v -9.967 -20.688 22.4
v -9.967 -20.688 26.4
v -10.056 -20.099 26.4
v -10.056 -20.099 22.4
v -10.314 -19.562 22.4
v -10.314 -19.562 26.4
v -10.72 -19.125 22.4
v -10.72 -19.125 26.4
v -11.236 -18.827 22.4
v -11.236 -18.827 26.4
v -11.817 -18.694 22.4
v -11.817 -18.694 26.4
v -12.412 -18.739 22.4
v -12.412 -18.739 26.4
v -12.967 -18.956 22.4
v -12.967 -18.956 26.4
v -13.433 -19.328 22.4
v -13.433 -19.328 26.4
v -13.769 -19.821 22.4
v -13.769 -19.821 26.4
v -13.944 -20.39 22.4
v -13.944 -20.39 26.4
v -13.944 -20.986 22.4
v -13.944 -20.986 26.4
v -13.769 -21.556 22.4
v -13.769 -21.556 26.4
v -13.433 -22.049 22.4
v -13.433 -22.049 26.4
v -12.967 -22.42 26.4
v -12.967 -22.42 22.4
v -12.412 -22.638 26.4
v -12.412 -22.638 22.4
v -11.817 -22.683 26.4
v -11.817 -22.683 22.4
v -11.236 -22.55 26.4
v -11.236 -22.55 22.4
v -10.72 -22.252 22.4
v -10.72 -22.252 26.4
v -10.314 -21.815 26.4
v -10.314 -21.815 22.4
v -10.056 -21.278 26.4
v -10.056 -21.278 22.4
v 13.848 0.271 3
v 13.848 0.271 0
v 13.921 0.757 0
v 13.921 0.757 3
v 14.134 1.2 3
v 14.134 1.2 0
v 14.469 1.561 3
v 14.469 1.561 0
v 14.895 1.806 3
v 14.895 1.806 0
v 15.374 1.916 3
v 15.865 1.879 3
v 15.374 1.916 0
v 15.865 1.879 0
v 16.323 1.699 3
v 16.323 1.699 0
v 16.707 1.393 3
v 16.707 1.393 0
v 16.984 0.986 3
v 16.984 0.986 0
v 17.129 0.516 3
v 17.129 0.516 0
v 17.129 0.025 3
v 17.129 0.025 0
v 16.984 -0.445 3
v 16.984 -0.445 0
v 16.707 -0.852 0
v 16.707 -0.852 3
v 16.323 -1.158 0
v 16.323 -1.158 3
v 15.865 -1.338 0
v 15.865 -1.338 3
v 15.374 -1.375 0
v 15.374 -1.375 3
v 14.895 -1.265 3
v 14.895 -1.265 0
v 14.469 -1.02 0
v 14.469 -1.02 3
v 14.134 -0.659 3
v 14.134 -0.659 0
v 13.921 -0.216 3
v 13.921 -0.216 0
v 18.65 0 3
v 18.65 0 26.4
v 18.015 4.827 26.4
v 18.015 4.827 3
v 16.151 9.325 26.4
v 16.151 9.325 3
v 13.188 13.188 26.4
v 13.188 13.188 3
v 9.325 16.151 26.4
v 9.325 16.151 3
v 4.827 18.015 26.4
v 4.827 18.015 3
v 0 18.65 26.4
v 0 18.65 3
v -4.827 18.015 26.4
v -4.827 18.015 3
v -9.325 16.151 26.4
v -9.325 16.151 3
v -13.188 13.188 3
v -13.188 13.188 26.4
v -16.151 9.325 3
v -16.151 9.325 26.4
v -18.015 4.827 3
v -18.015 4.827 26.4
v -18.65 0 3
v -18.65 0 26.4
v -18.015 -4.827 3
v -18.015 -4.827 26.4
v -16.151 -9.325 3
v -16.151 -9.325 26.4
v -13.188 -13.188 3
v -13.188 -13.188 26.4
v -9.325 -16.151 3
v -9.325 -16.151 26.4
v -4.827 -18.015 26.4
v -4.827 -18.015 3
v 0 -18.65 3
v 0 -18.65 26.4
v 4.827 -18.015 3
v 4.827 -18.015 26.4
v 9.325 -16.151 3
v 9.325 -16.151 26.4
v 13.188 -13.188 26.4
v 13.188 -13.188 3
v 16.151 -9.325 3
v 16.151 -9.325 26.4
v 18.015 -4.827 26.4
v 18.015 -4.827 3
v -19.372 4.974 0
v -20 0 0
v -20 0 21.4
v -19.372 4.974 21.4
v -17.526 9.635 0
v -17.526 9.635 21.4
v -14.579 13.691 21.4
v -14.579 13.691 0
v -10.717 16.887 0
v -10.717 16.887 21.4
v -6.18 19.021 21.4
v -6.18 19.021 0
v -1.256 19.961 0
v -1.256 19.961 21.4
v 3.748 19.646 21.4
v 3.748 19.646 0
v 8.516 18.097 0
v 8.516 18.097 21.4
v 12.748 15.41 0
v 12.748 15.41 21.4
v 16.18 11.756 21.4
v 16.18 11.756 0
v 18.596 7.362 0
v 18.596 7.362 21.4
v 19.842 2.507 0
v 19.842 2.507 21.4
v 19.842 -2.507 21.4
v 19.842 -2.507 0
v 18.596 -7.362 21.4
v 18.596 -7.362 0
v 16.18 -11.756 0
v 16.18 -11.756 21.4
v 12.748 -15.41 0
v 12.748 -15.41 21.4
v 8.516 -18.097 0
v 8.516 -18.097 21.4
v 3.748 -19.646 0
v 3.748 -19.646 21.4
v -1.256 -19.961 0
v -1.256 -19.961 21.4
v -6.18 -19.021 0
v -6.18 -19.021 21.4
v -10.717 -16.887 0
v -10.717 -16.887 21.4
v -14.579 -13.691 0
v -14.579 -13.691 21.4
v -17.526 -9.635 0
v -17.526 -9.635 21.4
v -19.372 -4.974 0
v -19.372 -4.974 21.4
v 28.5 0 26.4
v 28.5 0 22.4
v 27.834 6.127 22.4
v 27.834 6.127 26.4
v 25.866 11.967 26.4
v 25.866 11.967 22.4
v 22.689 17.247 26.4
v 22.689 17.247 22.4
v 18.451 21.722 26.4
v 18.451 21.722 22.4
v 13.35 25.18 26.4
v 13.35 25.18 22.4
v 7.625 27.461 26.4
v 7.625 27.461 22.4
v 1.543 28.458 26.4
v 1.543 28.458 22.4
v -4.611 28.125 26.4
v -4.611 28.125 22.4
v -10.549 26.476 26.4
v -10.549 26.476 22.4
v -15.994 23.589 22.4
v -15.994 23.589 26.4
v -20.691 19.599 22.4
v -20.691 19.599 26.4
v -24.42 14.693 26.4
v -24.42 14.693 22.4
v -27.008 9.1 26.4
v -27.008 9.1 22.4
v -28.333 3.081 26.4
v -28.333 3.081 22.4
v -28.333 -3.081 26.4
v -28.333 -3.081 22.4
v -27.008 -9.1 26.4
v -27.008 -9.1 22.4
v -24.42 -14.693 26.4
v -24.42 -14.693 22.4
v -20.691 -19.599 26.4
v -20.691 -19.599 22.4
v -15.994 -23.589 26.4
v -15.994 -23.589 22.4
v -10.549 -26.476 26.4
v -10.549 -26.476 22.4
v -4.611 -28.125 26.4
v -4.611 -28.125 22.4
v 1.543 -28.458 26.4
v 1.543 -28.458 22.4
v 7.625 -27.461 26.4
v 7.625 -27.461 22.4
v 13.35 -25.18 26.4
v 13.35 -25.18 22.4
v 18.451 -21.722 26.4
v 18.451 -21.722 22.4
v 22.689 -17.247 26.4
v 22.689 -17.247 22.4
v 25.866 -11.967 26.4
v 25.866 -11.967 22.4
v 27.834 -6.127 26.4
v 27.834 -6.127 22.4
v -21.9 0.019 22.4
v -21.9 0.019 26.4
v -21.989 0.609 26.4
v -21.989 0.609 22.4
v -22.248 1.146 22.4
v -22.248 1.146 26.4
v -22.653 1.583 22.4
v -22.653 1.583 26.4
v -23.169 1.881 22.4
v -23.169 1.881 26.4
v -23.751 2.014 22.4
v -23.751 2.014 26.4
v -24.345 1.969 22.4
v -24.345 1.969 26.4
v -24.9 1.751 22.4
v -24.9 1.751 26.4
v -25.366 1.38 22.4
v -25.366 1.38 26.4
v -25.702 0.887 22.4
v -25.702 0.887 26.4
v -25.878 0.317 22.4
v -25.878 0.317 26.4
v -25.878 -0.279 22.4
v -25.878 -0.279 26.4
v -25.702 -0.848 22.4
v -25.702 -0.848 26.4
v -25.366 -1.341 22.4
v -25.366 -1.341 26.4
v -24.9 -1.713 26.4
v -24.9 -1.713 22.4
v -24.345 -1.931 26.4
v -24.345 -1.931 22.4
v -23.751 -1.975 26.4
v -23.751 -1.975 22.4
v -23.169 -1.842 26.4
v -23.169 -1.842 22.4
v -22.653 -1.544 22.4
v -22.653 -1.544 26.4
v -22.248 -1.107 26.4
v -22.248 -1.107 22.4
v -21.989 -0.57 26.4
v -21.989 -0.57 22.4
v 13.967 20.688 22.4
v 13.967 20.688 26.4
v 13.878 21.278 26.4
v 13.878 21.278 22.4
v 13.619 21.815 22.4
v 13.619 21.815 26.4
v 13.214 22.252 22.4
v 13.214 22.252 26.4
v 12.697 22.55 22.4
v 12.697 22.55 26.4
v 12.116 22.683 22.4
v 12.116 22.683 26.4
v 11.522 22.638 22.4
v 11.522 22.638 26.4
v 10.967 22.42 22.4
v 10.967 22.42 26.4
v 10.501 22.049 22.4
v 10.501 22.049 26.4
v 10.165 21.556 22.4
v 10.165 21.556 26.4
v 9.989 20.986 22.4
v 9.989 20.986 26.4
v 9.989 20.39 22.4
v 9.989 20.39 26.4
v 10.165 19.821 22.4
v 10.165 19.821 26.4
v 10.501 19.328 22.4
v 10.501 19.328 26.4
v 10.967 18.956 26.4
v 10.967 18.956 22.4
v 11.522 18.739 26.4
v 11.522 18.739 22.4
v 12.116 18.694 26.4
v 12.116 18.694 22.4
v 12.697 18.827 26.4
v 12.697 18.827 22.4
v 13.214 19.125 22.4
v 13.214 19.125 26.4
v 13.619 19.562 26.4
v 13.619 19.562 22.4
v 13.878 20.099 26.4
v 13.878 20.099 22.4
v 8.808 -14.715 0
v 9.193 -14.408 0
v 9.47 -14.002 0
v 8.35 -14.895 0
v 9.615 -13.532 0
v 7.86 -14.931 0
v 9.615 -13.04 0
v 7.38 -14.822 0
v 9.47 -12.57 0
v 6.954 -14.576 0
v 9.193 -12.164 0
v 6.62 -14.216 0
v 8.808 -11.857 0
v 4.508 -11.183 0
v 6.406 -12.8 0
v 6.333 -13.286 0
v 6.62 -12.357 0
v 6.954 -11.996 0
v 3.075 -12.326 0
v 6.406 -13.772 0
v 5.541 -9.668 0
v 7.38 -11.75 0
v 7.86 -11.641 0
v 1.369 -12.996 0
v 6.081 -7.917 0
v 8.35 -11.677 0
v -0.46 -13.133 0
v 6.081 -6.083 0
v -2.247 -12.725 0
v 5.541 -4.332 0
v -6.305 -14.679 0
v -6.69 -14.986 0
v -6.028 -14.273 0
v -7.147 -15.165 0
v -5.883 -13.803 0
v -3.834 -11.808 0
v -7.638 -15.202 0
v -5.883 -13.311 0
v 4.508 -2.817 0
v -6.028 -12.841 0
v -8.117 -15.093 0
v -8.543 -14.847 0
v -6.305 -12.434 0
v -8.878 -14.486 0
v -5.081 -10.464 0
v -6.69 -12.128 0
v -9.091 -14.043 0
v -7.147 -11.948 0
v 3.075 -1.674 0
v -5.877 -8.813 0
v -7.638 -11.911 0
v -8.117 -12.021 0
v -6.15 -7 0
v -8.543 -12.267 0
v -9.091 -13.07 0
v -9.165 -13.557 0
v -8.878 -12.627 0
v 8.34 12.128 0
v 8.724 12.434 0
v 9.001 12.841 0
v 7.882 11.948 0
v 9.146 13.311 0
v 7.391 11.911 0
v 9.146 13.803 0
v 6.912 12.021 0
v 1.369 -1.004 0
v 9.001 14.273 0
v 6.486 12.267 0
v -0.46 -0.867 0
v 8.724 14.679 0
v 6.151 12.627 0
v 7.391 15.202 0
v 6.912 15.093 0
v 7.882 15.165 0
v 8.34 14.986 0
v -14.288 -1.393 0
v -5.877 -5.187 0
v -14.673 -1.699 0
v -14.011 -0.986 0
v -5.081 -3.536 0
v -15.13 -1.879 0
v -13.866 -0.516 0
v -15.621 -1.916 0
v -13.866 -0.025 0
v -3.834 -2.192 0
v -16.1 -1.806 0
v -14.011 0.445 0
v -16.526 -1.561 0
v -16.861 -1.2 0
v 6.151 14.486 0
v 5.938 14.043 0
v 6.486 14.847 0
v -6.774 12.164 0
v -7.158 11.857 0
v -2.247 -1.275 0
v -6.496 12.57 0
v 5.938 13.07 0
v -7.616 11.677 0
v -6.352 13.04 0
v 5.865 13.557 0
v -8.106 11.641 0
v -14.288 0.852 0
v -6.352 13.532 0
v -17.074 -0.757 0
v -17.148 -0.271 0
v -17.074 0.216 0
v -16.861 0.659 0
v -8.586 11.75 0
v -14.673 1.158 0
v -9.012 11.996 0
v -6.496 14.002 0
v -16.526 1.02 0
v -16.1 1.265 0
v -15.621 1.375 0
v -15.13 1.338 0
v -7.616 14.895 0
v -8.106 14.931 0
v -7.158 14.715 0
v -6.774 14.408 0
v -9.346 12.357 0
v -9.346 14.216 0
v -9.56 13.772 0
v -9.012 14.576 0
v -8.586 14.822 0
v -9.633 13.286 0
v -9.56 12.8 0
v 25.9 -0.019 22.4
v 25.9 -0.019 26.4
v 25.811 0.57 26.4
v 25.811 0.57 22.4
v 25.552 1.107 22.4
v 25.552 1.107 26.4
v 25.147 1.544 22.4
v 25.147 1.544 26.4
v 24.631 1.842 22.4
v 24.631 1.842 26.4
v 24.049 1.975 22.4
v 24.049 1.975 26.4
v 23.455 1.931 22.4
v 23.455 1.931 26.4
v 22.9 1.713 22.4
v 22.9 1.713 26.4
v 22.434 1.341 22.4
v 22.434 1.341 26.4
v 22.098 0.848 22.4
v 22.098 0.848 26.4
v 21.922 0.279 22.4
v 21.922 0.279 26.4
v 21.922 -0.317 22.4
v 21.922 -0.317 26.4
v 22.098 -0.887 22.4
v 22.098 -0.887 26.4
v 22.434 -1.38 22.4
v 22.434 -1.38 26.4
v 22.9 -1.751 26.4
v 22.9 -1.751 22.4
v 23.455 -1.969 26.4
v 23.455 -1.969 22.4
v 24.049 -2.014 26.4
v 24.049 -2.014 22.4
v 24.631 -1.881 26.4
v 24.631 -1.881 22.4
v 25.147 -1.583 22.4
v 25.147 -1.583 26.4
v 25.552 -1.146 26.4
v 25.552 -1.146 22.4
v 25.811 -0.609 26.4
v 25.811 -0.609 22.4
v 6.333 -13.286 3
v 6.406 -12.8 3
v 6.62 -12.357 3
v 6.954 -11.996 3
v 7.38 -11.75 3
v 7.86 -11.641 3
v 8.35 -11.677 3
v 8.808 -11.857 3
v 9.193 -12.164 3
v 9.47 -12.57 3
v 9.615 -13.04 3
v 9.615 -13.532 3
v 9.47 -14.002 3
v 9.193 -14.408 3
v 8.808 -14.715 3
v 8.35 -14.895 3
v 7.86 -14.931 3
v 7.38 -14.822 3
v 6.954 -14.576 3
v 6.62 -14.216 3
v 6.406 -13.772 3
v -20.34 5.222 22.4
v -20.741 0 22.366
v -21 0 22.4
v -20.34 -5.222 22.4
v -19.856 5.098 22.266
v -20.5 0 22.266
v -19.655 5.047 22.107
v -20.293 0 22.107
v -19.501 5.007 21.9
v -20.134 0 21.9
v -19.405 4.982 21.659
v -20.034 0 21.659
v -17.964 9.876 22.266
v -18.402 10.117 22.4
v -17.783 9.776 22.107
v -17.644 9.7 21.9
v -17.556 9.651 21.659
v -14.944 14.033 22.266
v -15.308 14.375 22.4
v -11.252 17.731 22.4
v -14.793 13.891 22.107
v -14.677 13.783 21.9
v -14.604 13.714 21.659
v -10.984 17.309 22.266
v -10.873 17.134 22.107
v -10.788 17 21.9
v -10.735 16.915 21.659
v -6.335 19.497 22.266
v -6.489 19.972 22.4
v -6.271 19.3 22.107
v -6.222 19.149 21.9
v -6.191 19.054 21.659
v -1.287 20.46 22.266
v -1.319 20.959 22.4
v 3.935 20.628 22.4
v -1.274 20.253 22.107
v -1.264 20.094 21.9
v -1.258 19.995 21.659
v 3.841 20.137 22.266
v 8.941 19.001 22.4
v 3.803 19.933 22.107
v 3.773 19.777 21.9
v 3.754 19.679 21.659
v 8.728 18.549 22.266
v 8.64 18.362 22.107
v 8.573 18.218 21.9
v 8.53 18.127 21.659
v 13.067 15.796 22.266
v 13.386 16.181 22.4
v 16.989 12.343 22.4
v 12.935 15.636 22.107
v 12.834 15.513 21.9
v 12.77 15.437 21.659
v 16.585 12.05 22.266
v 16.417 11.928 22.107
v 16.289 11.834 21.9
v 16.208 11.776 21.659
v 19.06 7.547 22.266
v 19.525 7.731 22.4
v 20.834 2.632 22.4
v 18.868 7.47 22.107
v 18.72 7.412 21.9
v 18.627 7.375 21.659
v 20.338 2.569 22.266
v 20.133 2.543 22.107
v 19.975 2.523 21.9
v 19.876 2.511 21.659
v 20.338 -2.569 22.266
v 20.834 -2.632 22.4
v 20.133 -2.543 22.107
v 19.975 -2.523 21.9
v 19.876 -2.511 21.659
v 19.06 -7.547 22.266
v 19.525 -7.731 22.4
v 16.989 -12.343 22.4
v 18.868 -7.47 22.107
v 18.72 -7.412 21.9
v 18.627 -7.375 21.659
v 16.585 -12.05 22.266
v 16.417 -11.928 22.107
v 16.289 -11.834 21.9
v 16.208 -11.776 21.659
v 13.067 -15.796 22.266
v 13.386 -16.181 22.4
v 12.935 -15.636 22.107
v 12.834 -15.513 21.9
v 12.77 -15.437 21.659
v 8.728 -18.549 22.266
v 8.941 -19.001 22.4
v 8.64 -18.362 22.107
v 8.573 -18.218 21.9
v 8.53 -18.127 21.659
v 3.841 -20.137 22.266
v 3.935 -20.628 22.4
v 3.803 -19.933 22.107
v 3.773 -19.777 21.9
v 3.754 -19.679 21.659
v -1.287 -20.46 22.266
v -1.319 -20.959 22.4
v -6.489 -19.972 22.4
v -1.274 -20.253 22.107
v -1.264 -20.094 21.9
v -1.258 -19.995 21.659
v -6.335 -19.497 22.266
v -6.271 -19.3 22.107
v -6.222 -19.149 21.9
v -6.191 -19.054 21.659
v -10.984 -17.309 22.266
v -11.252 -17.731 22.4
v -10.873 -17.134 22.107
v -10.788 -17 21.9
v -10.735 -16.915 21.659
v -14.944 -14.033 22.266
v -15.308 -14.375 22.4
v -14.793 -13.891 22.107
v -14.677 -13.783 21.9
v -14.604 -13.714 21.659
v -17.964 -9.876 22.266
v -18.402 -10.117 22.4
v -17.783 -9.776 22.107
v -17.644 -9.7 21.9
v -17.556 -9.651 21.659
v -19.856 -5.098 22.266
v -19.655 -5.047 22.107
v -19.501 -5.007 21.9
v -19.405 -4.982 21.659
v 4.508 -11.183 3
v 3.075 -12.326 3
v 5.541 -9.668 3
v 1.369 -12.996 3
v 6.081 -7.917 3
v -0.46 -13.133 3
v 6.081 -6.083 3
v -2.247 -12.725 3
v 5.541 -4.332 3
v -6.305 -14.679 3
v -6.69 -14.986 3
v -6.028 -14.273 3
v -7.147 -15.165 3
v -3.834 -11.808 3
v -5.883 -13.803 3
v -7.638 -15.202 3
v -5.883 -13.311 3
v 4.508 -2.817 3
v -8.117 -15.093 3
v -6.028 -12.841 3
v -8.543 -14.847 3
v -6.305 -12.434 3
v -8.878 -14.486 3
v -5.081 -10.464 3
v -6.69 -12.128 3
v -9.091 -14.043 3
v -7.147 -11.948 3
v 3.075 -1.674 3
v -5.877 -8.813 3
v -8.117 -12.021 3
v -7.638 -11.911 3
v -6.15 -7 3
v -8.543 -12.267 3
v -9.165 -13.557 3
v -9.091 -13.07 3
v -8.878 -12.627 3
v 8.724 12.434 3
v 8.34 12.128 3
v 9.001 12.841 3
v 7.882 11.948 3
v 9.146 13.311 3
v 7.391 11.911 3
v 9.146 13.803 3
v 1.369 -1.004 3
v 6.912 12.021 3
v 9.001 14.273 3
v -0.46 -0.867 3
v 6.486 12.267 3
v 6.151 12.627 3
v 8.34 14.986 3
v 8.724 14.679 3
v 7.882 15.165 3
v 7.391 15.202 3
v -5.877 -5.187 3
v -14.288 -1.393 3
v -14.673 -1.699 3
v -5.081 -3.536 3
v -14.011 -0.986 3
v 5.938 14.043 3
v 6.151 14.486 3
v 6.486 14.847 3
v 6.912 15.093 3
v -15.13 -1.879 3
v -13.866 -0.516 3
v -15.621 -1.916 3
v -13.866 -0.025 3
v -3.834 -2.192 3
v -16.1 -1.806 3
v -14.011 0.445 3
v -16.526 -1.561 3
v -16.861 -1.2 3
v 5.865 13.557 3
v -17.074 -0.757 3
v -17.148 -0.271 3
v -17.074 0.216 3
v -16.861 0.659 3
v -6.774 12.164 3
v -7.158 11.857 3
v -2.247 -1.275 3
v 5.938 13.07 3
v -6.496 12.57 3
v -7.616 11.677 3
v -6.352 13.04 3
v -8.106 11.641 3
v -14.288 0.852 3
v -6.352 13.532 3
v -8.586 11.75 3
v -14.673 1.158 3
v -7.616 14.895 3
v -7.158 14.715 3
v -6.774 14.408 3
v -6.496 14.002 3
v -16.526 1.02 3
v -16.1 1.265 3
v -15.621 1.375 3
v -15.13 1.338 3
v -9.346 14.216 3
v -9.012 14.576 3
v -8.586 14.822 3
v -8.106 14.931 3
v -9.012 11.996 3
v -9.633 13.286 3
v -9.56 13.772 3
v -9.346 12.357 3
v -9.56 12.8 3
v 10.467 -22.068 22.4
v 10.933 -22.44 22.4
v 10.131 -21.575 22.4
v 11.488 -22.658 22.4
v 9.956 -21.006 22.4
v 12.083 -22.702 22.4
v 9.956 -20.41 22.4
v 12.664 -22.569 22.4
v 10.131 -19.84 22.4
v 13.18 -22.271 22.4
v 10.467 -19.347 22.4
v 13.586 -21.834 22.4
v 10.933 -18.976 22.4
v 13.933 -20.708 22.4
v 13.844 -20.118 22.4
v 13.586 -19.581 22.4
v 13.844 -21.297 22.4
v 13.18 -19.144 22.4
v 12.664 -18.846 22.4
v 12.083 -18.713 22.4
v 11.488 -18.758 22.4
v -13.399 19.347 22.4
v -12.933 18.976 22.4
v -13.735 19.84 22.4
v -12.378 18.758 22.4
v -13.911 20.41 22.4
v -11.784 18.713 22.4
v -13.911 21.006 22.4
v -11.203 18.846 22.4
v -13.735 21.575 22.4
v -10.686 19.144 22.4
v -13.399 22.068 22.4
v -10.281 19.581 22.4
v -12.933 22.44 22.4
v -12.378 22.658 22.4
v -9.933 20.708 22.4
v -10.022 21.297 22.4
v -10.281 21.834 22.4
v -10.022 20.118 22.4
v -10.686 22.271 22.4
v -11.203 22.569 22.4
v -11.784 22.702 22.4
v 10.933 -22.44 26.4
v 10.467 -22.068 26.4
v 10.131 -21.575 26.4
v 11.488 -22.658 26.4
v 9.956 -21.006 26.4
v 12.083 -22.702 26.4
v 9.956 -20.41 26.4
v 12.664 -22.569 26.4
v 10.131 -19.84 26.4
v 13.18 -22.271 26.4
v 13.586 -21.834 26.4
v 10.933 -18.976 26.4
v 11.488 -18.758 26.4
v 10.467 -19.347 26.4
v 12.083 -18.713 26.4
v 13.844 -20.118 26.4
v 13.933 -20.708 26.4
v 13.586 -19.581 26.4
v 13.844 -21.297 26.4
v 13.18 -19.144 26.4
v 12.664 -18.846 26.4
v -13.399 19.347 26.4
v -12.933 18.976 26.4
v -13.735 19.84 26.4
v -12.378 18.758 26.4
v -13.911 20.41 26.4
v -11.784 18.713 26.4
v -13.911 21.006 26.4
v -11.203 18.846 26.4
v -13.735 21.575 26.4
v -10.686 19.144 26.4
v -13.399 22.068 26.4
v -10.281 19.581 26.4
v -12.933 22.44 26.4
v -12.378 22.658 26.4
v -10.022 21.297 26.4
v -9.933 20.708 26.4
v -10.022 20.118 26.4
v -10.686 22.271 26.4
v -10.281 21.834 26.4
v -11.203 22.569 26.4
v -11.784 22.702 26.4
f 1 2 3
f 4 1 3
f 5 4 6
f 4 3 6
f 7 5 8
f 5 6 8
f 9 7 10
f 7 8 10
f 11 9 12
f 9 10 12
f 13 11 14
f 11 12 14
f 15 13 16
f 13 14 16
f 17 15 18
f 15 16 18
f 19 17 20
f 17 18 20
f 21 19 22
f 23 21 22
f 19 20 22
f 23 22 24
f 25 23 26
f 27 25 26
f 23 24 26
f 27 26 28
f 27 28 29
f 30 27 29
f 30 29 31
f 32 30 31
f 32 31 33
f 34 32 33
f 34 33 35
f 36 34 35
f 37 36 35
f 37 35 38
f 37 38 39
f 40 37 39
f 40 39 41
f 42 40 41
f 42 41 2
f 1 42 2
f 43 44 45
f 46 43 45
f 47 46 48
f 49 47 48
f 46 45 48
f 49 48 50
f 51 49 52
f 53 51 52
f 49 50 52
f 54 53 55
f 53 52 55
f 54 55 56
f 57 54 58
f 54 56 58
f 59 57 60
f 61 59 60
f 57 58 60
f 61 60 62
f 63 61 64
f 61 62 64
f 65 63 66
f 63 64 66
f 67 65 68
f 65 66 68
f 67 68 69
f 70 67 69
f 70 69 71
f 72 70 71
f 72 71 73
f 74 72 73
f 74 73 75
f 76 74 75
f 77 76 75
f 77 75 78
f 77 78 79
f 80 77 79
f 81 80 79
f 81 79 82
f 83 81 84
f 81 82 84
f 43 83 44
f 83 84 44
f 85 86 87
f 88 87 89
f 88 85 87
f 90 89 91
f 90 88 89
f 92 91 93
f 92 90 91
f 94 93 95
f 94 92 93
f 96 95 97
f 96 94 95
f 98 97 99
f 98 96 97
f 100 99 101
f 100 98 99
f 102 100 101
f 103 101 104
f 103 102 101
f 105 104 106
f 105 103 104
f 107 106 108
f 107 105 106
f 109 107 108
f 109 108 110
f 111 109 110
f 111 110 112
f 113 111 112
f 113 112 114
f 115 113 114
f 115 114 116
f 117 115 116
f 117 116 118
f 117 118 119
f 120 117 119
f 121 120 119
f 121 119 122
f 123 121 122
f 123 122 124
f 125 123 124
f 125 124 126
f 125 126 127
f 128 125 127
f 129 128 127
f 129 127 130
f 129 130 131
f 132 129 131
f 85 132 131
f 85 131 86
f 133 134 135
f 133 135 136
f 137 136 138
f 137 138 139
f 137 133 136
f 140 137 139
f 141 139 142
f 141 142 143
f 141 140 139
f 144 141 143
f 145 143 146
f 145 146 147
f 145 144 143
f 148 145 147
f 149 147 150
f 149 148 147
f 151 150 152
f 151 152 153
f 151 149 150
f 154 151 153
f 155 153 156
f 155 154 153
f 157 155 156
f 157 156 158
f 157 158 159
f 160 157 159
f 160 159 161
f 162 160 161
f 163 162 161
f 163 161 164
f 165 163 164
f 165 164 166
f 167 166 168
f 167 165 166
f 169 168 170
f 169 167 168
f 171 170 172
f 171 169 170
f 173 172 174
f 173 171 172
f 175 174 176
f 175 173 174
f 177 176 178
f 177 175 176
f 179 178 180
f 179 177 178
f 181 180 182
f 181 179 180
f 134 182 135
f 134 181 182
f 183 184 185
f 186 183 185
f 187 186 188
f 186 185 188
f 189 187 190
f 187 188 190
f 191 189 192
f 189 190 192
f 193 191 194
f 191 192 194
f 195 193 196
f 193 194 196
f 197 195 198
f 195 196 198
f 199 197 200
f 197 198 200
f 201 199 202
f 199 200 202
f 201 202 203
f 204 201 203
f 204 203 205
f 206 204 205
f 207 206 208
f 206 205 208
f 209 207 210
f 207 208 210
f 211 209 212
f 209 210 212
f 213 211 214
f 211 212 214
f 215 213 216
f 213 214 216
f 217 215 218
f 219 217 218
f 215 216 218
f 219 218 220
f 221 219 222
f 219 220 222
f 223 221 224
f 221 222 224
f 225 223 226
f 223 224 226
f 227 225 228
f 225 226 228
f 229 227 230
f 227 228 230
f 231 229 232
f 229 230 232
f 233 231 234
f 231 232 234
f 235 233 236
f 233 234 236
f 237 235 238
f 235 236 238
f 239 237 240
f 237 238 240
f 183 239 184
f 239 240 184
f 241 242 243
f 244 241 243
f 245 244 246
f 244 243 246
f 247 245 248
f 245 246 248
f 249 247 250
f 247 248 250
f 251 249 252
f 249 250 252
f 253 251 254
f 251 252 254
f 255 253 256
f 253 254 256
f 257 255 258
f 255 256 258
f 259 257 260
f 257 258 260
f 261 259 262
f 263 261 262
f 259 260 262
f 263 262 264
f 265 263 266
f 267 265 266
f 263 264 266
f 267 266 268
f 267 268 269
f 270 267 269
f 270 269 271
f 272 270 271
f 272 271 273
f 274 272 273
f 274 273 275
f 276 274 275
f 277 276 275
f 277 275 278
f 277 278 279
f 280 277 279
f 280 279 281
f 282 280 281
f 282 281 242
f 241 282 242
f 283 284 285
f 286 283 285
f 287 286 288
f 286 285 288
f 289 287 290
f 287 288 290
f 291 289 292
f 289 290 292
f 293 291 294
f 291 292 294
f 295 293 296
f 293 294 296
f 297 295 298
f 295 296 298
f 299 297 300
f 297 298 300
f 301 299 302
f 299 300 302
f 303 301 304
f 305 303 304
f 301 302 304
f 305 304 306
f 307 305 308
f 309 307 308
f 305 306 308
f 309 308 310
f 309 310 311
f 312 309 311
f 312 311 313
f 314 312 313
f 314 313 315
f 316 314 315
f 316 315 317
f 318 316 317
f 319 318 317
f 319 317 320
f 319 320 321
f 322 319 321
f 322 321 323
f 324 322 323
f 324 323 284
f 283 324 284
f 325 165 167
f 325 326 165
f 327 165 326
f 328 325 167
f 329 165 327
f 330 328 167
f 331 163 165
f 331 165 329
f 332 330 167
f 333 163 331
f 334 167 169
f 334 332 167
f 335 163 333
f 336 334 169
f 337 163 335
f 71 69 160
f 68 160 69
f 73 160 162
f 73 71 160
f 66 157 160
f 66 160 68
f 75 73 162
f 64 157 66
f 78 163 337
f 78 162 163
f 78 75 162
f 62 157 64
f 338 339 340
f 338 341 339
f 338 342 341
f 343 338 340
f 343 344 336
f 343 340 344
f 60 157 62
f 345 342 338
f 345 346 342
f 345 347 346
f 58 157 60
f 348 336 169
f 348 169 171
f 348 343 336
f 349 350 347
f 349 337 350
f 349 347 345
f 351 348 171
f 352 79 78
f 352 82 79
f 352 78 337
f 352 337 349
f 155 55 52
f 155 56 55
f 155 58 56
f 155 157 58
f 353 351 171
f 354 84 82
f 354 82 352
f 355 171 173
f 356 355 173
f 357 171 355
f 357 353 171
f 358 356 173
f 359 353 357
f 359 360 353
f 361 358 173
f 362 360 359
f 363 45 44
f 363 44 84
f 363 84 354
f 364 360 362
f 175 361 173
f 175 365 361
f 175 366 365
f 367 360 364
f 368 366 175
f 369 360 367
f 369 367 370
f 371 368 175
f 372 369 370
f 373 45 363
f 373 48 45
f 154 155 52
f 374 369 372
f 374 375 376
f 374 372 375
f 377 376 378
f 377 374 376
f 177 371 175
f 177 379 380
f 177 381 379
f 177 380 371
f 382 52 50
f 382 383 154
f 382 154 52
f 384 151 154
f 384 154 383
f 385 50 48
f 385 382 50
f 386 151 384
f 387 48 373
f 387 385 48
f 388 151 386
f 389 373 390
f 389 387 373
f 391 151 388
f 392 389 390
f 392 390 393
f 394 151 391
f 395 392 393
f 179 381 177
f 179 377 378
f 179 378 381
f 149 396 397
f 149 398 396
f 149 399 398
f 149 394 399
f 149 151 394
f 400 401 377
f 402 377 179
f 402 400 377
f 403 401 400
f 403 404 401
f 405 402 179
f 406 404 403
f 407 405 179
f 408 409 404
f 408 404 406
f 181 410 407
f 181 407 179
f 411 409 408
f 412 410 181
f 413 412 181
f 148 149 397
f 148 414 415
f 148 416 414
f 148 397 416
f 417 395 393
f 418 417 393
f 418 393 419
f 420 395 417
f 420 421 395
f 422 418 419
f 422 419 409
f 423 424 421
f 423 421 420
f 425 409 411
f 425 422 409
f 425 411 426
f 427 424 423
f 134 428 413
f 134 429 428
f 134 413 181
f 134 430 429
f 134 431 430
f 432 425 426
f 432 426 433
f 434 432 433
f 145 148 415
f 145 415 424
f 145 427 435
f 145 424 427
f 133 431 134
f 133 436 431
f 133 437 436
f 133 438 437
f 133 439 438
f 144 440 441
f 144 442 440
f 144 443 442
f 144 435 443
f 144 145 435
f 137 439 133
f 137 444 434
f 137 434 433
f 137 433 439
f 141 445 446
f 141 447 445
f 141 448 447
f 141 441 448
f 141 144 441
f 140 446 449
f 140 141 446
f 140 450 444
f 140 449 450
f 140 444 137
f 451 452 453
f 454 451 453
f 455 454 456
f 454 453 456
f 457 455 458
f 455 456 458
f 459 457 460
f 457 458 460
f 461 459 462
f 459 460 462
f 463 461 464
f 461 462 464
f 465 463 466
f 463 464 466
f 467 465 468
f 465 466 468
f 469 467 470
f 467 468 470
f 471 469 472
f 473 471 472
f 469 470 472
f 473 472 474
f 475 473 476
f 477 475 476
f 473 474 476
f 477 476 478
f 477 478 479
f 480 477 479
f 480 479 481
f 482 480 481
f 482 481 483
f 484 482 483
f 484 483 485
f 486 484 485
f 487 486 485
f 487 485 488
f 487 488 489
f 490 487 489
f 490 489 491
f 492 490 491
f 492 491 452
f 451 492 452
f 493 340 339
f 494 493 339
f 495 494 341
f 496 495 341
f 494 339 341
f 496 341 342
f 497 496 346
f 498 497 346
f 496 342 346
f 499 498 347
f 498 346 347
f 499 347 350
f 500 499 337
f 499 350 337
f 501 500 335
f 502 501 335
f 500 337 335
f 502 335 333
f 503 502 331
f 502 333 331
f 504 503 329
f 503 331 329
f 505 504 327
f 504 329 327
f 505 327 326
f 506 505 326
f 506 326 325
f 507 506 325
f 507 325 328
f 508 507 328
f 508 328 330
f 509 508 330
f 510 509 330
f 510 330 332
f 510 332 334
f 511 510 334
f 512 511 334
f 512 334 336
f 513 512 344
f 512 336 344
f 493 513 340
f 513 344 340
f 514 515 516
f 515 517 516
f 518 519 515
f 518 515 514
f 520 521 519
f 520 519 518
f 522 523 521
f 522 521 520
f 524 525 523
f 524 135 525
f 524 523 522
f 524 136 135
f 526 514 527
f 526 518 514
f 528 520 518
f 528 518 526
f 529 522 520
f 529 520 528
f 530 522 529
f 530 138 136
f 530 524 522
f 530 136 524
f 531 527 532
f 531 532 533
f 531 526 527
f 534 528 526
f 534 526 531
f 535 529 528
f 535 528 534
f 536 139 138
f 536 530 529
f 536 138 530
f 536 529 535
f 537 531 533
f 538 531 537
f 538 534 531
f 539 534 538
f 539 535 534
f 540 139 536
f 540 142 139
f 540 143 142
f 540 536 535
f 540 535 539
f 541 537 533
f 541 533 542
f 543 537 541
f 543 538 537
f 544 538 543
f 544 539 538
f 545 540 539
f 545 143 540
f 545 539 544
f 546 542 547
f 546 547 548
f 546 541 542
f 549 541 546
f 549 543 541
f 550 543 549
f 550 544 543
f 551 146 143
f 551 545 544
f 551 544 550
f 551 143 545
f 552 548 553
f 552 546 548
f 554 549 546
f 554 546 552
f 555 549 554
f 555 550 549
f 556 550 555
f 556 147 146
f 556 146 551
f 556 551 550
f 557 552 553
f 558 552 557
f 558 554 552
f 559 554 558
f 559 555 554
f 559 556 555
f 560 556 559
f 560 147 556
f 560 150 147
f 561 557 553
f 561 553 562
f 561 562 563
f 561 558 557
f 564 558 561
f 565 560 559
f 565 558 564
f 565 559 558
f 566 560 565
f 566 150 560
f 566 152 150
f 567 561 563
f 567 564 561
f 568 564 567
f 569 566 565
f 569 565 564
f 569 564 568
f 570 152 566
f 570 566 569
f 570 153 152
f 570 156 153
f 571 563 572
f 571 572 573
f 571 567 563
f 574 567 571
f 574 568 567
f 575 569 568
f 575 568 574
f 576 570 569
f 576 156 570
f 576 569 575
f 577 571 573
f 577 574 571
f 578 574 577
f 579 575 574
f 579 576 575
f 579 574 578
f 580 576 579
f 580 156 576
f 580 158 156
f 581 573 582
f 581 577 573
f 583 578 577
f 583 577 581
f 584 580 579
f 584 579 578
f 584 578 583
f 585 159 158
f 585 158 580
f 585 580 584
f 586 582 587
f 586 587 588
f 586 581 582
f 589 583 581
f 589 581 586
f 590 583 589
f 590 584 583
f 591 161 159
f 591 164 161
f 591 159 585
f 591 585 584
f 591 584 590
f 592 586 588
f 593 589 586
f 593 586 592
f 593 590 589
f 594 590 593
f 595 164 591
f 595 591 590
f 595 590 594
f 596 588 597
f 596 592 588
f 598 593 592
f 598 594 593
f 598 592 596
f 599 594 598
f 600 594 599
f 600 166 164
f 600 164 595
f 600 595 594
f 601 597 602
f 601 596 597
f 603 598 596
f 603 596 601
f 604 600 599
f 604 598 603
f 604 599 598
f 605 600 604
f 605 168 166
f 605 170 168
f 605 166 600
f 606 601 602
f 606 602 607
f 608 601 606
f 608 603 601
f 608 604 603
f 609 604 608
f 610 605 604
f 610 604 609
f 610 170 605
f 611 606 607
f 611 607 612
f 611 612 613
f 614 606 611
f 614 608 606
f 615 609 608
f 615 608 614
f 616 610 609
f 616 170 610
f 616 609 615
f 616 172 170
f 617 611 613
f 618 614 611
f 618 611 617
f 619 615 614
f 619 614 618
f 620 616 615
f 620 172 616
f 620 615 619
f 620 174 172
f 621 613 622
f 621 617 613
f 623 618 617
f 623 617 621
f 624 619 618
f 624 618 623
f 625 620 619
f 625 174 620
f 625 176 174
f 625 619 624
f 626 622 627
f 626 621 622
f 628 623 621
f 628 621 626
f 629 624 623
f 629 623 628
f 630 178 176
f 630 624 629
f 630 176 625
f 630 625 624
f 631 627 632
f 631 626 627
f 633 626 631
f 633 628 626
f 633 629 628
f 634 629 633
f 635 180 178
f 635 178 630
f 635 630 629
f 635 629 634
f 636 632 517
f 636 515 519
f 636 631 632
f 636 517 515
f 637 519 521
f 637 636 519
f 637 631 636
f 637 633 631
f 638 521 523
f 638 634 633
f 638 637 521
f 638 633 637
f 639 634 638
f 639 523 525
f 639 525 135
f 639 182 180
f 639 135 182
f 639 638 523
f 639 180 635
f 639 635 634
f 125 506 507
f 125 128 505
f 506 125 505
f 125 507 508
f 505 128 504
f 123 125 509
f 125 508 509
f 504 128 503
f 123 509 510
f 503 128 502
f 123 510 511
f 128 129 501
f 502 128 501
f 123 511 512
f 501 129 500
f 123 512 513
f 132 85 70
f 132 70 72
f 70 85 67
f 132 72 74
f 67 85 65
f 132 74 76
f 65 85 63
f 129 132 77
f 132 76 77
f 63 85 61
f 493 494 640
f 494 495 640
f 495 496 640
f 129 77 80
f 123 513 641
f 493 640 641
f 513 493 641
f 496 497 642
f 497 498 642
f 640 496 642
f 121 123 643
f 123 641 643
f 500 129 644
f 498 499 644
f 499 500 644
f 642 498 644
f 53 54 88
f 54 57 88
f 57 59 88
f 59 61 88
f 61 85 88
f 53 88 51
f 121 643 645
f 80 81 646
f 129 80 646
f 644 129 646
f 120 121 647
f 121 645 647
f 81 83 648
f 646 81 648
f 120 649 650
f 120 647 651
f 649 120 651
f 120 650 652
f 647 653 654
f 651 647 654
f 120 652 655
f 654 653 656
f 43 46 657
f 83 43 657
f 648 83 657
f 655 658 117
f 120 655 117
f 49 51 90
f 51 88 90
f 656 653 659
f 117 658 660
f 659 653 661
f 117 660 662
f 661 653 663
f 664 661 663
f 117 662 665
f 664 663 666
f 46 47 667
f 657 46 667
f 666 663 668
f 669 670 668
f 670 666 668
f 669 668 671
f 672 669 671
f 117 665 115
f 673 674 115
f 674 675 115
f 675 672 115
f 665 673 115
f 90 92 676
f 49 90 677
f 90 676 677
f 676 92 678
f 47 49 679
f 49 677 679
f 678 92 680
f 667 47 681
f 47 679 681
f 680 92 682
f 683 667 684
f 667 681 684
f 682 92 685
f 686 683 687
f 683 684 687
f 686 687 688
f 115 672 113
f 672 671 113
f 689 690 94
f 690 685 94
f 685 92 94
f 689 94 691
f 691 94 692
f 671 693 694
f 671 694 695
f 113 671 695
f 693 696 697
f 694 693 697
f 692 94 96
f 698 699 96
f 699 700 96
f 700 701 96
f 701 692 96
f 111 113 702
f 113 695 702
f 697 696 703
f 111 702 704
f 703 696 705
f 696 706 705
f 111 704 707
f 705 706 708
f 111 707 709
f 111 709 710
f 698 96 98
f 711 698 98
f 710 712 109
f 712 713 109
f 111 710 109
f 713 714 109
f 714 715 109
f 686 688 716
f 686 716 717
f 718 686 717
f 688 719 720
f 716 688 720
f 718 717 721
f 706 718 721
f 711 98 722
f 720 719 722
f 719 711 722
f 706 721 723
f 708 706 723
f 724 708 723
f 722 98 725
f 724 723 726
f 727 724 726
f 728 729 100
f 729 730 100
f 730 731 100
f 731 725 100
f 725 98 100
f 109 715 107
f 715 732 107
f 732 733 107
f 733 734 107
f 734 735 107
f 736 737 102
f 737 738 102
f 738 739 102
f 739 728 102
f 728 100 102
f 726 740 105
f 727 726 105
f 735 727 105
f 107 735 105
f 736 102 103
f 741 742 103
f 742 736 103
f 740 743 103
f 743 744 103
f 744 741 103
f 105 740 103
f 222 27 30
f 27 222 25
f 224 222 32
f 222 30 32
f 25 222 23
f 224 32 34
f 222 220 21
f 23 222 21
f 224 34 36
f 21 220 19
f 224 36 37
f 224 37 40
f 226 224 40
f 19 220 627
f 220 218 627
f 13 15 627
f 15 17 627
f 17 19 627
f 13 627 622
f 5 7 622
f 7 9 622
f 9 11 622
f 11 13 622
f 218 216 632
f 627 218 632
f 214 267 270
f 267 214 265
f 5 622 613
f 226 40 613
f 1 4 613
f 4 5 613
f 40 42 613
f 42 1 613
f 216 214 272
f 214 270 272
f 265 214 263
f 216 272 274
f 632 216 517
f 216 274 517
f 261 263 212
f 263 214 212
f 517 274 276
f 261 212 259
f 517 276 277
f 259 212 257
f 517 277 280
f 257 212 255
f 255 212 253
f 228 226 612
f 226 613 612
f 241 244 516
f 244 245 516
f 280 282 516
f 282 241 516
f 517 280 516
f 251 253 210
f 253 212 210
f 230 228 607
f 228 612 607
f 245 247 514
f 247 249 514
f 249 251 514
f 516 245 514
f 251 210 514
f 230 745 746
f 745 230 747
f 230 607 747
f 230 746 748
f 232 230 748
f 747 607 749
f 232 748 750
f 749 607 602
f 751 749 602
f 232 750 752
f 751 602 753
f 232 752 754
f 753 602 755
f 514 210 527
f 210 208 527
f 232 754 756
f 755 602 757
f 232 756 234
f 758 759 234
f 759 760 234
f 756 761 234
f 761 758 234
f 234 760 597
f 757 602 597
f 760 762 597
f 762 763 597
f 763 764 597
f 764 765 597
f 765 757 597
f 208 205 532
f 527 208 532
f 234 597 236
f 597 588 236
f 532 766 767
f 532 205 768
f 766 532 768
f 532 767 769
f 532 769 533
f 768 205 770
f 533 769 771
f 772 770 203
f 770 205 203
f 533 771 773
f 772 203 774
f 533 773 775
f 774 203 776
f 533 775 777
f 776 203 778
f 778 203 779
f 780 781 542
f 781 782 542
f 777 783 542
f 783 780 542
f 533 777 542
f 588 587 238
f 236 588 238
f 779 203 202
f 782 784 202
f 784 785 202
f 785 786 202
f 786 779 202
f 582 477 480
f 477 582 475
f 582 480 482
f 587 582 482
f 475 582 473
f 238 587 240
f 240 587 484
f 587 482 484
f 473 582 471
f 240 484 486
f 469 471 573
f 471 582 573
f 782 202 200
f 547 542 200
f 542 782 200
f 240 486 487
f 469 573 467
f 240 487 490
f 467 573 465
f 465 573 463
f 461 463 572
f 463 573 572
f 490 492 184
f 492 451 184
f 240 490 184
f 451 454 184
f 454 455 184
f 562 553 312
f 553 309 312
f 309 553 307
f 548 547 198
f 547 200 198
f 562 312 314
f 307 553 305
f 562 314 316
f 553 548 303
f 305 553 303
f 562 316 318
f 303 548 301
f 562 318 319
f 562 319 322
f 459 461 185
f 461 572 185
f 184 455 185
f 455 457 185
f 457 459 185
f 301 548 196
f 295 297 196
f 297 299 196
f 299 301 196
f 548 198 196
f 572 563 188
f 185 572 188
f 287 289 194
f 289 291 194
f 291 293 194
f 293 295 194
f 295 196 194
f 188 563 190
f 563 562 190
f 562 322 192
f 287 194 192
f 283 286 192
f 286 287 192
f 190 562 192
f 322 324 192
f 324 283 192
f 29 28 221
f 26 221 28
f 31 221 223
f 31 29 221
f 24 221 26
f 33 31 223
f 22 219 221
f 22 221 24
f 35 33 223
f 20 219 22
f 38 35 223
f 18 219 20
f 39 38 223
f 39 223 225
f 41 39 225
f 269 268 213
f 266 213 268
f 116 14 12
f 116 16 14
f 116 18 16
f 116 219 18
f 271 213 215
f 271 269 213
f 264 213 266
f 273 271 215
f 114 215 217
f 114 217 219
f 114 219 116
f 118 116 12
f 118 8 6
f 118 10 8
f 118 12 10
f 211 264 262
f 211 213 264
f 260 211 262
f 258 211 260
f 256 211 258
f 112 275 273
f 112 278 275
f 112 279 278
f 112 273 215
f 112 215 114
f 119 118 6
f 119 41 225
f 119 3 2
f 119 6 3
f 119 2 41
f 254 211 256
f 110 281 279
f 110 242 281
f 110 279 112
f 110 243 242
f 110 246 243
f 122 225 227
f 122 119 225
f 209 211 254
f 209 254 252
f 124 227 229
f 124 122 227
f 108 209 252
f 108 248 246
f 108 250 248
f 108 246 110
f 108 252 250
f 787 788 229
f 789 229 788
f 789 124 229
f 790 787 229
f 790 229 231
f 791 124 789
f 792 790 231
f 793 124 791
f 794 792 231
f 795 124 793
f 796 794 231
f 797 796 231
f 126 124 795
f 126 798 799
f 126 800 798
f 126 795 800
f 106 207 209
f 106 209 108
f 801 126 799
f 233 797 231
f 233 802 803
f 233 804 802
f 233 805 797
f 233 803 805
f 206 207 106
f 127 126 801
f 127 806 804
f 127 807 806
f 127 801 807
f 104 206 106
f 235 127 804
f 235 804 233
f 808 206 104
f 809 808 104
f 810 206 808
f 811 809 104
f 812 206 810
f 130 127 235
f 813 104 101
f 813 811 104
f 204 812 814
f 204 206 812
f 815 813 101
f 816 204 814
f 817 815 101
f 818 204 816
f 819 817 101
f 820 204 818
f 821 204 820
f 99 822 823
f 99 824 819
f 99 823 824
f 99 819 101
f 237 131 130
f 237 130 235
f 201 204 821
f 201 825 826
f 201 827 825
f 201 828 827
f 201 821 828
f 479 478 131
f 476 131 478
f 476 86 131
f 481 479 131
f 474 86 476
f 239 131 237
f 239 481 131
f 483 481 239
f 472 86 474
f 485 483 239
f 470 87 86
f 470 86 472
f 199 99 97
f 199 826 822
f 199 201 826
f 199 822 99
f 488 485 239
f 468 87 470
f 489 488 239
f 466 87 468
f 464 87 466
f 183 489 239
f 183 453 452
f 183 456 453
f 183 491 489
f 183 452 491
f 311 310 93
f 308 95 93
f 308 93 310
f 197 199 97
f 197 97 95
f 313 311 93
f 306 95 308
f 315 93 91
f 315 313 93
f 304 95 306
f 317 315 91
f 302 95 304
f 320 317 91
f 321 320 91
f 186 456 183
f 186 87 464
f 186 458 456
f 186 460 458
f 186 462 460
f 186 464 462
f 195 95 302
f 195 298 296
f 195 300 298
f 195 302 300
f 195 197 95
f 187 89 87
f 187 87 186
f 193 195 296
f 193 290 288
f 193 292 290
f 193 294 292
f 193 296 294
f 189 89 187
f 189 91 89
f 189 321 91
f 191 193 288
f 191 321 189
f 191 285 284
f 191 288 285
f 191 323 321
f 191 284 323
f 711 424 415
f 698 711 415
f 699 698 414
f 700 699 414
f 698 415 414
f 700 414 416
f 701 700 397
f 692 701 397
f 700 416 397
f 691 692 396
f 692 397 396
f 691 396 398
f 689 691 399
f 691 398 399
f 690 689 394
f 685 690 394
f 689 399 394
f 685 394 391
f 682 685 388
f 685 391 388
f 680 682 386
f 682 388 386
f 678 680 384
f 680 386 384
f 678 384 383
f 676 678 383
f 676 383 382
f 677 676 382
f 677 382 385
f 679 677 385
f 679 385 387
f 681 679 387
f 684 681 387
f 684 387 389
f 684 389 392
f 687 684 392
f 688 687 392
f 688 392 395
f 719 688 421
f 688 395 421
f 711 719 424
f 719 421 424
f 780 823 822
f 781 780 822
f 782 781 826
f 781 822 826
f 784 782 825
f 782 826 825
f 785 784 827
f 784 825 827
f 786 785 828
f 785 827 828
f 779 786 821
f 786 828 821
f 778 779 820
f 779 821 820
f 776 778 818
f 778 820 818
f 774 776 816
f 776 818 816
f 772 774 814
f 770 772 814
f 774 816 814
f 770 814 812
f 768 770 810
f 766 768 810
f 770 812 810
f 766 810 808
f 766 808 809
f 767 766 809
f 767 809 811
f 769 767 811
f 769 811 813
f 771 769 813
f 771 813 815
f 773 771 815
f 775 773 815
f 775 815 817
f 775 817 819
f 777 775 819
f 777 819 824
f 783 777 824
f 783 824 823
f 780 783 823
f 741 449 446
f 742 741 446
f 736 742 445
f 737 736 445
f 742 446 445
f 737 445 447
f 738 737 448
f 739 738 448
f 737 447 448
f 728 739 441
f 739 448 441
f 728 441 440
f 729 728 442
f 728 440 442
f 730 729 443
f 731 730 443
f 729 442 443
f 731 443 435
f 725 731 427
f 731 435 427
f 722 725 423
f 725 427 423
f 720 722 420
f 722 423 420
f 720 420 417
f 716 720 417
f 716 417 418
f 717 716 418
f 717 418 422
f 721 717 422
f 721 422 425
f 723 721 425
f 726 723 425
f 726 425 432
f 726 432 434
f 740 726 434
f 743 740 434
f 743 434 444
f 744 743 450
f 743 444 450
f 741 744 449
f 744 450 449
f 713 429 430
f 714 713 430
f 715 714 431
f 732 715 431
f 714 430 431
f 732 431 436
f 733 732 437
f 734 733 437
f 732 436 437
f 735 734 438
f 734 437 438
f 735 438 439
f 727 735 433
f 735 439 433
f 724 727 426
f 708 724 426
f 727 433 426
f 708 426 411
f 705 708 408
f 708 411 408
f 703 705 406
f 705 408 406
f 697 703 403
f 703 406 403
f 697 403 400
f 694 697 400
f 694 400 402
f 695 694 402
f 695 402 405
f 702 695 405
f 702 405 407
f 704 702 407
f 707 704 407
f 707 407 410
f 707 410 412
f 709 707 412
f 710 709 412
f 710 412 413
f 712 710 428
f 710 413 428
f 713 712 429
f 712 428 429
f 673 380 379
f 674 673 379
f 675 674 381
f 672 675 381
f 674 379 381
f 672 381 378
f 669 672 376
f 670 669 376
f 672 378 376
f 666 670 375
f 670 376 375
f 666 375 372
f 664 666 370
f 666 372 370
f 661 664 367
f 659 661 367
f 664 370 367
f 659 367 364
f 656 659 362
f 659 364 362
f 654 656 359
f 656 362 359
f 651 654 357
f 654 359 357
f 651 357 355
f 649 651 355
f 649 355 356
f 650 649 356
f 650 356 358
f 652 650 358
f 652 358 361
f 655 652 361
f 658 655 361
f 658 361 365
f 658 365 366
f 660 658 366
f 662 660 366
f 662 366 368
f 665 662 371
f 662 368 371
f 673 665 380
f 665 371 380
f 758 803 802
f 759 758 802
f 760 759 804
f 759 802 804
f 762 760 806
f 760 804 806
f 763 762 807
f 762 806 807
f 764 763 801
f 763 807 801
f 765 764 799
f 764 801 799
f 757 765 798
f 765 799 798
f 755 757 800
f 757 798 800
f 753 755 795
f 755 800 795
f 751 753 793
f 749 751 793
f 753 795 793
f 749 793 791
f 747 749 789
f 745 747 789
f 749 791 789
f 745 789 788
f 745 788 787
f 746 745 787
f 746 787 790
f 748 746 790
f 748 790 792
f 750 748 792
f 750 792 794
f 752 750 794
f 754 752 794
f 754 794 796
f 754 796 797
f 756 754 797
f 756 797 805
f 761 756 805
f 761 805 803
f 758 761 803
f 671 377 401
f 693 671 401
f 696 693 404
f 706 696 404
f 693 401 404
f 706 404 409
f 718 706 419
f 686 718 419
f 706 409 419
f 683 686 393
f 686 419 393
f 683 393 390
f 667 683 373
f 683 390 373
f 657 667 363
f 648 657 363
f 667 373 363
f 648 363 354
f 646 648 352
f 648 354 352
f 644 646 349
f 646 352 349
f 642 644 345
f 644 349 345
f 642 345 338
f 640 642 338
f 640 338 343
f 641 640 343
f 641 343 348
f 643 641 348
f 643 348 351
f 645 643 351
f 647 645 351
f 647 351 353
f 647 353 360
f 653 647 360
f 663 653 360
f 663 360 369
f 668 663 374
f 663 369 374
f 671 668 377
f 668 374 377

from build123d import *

# Parameters (mm, degrees)
CROQUIS1_R              = 21.4
CROQUIS1_R_2            = 18.65
SALIENTE_EXTRUIR1_DEPTH = 26.4
CROQUIS2_R              = 18.65
SALIENTE_EXTRUIR2_DEPTH = 3
SALIENTE_EXTRUIR3_START = -4
CROQUIS3_R              = 28.5
CROQUIS3_R_2            = 21.4
SALIENTE_EXTRUIR3_DEPTH = 4
CROQUIS4_R              = 6.15
CROQUIS4_R_2            = 1.65
CORTAR_EXTRUIR1_DEPTH   = 3
CROQUIS6_R              = 2
CORTAR_EXTRUIR2_DEPTH   = 49.181531732
CROQUIS7_R              = 21.4
CROQUIS7_R_2            = 20
CORTAR_EXTRUIR3_DEPTH   = 22.4
REDONDEO1_R             = 1


with BuildPart() as part:
    # Croquis1 → Saliente-Extruir1 (new body)
    with BuildSketch(Plane.XY):
        Circle(CROQUIS1_R)
        Circle(CROQUIS1_R_2, mode=Mode.SUBTRACT)
    extrude(amount=SALIENTE_EXTRUIR1_DEPTH)

    # Croquis2 → Saliente-Extruir2 (add)
    with BuildSketch(Plane(origin=(0, 0, 0), x_dir=(-1, 0, 0), z_dir=(0, 0, -1))):
        Circle(CROQUIS2_R)
    extrude(amount=-SALIENTE_EXTRUIR2_DEPTH)

    # Croquis3 → Saliente-Extruir3 (add)
    with BuildSketch(Plane.XY.offset(26.4).offset(SALIENTE_EXTRUIR3_START)):
        Circle(CROQUIS3_R)
        Circle(CROQUIS3_R_2, mode=Mode.SUBTRACT)
    extrude(amount=SALIENTE_EXTRUIR3_DEPTH)

    # Croquis4 → Cortar-Extruir1 (cut)
    with BuildSketch(Plane(origin=(0, 0, 0), x_dir=(-1, 0, 0), z_dir=(0, 0, -1))):
        with Locations((0, -7)):
            Circle(CROQUIS4_R)
        with Locations((-15.497639275, 0.2705123)):
            Circle(CROQUIS4_R_2)
        with Locations((-7.514549114, 13.556605461)):
            Circle(CROQUIS4_R_2)
        with Locations((7.983090161, 13.286093161)):
            Circle(CROQUIS4_R_2)
        with Locations((15.497639275, -0.2705123)):
            Circle(CROQUIS4_R_2)
        with Locations((7.514549114, -13.556605461)):
            Circle(CROQUIS4_R_2)
        with Locations((-7.983090161, -13.286093161)):
            Circle(CROQUIS4_R_2)
    extrude(amount=-CORTAR_EXTRUIR1_DEPTH, mode=Mode.SUBTRACT)

    # Croquis6 → Cortar-Extruir2 (cut, through all)
    with BuildSketch(Plane.XY.offset(26.4)):
        with Locations((11.96671541, 20.688356504)):
            Circle(CROQUIS6_R)
        with Locations((23.9, -0.019301293)):
            Circle(CROQUIS6_R)
        with Locations((-11.93328459, 20.707657797)):
            Circle(CROQUIS6_R)
        with Locations((11.93328459, -20.707657797)):
            Circle(CROQUIS6_R)
        with Locations((-11.96671541, -20.688356504)):
            Circle(CROQUIS6_R)
        with Locations((-23.9, 0.019301293)):
            Circle(CROQUIS6_R)
    extrude(amount=-CORTAR_EXTRUIR2_DEPTH, mode=Mode.SUBTRACT)

    # Croquis7 → Cortar-Extruir3 (cut)
    with BuildSketch(Plane(origin=(0, 0, 0), x_dir=(-1, 0, 0), z_dir=(0, 0, -1))):
        Circle(CROQUIS7_R)
        Circle(CROQUIS7_R_2, mode=Mode.SUBTRACT)
    extrude(amount=-CORTAR_EXTRUIR3_DEPTH, mode=Mode.SUBTRACT)

    # Redondeo1
    redondeo1_edges = [part.edges().sort_by_distance(p)[0] for p in [
        (20, 0, 22.4),
    ]]
    fillet(redondeo1_edges, radius=REDONDEO1_R)


solid = part.part
